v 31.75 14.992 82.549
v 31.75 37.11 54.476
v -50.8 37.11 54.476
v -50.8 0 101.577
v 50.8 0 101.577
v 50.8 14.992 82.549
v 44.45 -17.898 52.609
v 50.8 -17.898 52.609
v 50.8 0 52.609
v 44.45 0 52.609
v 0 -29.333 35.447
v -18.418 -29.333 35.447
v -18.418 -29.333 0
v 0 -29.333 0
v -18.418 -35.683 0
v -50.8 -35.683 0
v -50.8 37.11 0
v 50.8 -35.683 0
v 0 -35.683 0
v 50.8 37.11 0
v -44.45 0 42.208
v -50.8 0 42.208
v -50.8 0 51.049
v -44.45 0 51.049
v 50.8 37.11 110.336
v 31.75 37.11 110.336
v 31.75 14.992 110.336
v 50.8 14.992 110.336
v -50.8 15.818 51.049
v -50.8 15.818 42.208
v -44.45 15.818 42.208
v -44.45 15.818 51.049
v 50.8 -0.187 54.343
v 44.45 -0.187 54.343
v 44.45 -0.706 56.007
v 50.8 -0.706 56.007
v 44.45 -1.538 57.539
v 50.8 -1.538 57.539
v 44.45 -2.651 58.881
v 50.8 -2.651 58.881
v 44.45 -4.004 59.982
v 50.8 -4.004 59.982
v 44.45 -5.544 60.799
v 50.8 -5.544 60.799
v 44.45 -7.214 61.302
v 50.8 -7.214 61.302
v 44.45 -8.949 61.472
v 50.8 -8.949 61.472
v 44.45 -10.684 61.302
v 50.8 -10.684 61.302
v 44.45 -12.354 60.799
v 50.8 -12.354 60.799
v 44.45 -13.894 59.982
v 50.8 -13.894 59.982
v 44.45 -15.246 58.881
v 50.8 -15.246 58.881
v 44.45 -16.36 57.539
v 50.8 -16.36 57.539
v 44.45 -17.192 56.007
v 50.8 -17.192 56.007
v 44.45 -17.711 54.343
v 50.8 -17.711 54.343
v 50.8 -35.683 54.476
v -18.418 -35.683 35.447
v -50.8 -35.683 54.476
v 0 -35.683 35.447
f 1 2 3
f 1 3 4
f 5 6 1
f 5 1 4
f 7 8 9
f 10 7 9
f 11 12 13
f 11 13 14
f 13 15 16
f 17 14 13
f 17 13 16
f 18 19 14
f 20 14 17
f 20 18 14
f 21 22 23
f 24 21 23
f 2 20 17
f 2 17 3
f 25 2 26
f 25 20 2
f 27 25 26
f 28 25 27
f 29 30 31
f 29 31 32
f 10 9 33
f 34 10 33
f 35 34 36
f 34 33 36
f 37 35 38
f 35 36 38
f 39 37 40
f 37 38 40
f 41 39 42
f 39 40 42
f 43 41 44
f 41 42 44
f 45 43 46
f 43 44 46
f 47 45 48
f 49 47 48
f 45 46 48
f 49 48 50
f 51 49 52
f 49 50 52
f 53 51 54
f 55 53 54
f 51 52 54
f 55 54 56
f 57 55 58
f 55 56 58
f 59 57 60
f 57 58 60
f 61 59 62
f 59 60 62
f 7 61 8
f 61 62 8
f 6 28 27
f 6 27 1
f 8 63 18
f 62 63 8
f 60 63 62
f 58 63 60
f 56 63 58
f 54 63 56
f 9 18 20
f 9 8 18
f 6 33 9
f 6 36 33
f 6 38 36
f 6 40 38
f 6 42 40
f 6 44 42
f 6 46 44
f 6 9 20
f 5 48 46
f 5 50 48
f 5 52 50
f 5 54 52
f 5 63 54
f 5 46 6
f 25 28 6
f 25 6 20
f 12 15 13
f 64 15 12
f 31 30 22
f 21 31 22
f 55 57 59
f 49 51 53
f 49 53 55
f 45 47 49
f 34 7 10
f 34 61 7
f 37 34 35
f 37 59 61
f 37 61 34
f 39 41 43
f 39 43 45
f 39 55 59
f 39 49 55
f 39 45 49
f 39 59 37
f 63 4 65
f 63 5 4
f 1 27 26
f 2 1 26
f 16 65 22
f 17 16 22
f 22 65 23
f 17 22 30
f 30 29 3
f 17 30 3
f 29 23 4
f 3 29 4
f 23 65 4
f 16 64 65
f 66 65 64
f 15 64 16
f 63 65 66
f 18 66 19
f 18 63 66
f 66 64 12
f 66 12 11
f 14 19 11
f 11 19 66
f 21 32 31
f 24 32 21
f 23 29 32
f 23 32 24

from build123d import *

# Parameters (mm, degrees)
F1_DEPTH      = 50.8
F1_DEPTH_BACK = 50.8
F3_DEPTH      = 19.05
F4_W          = 18.4178259224
F4_H          = 35.4467518628
F5_DEPTH      = 6.35
F6_W          = 15.8175062388
F6_H          = 8.841086179
F7_DEPTH      = 6.35
F9_DEPTH      = 6.35


with BuildPart() as f1:
    # F0 (on Right) → F1 (new body, two sides)
    with BuildSketch(Plane.YZ) as f1_sk:
        Polygon((-35.6828793883, 54.4758699834), (-35.6828793883, 0), (37.1101982892, 0), (37.1101982892, 54.4758699834), (0, 101.5772745013), align=None)
    extrude(amount=F1_DEPTH)
    extrude(f1_sk.sketch, amount=-F1_DEPTH_BACK)

    # F2 (on face) → F3 (join)
    with BuildSketch(Plane.YZ.offset(50.8)):
        Polygon((14.9918657955, 110.3359609842), (14.9918657955, 82.5491375506), (37.1101982892, 54.4758699834), (37.1101982892, 110.3359609842), align=None)
    extrude(amount=-F3_DEPTH)

    # F4 (on face) → F5 (cut)
    with BuildSketch(Plane.XZ.offset(35.6828793883)):
        with Locations((-9.2089129612, 17.7233759314)):
            Rectangle(F4_W, F4_H)
    extrude(amount=-F5_DEPTH, mode=Mode.SUBTRACT)

    # F6 (on face) → F7 (cut)
    with BuildSketch(Plane(origin=(-50.8, 0, 0), x_dir=(0, -1, 0), z_dir=(-1, 0, 0))):
        with Locations((-7.9087531194, 46.6281268746)):
            Rectangle(F6_W, F6_H)
    extrude(amount=-F7_DEPTH, mode=Mode.SUBTRACT)

    # F8 (on face) → F9 (cut)
    with BuildSketch(Plane.YZ.offset(50.8)):
        with BuildLine():
            Line((-17.8977604955, 52.6088625193), (0, 52.6088625193))
            ThreePointArc((0, 52.6088625193), (-8.9488802478, 61.4720002386), (-17.8977604955, 52.6088625193))
        make_face()
    extrude(amount=-F9_DEPTH, mode=Mode.SUBTRACT)


solid = f1.part
